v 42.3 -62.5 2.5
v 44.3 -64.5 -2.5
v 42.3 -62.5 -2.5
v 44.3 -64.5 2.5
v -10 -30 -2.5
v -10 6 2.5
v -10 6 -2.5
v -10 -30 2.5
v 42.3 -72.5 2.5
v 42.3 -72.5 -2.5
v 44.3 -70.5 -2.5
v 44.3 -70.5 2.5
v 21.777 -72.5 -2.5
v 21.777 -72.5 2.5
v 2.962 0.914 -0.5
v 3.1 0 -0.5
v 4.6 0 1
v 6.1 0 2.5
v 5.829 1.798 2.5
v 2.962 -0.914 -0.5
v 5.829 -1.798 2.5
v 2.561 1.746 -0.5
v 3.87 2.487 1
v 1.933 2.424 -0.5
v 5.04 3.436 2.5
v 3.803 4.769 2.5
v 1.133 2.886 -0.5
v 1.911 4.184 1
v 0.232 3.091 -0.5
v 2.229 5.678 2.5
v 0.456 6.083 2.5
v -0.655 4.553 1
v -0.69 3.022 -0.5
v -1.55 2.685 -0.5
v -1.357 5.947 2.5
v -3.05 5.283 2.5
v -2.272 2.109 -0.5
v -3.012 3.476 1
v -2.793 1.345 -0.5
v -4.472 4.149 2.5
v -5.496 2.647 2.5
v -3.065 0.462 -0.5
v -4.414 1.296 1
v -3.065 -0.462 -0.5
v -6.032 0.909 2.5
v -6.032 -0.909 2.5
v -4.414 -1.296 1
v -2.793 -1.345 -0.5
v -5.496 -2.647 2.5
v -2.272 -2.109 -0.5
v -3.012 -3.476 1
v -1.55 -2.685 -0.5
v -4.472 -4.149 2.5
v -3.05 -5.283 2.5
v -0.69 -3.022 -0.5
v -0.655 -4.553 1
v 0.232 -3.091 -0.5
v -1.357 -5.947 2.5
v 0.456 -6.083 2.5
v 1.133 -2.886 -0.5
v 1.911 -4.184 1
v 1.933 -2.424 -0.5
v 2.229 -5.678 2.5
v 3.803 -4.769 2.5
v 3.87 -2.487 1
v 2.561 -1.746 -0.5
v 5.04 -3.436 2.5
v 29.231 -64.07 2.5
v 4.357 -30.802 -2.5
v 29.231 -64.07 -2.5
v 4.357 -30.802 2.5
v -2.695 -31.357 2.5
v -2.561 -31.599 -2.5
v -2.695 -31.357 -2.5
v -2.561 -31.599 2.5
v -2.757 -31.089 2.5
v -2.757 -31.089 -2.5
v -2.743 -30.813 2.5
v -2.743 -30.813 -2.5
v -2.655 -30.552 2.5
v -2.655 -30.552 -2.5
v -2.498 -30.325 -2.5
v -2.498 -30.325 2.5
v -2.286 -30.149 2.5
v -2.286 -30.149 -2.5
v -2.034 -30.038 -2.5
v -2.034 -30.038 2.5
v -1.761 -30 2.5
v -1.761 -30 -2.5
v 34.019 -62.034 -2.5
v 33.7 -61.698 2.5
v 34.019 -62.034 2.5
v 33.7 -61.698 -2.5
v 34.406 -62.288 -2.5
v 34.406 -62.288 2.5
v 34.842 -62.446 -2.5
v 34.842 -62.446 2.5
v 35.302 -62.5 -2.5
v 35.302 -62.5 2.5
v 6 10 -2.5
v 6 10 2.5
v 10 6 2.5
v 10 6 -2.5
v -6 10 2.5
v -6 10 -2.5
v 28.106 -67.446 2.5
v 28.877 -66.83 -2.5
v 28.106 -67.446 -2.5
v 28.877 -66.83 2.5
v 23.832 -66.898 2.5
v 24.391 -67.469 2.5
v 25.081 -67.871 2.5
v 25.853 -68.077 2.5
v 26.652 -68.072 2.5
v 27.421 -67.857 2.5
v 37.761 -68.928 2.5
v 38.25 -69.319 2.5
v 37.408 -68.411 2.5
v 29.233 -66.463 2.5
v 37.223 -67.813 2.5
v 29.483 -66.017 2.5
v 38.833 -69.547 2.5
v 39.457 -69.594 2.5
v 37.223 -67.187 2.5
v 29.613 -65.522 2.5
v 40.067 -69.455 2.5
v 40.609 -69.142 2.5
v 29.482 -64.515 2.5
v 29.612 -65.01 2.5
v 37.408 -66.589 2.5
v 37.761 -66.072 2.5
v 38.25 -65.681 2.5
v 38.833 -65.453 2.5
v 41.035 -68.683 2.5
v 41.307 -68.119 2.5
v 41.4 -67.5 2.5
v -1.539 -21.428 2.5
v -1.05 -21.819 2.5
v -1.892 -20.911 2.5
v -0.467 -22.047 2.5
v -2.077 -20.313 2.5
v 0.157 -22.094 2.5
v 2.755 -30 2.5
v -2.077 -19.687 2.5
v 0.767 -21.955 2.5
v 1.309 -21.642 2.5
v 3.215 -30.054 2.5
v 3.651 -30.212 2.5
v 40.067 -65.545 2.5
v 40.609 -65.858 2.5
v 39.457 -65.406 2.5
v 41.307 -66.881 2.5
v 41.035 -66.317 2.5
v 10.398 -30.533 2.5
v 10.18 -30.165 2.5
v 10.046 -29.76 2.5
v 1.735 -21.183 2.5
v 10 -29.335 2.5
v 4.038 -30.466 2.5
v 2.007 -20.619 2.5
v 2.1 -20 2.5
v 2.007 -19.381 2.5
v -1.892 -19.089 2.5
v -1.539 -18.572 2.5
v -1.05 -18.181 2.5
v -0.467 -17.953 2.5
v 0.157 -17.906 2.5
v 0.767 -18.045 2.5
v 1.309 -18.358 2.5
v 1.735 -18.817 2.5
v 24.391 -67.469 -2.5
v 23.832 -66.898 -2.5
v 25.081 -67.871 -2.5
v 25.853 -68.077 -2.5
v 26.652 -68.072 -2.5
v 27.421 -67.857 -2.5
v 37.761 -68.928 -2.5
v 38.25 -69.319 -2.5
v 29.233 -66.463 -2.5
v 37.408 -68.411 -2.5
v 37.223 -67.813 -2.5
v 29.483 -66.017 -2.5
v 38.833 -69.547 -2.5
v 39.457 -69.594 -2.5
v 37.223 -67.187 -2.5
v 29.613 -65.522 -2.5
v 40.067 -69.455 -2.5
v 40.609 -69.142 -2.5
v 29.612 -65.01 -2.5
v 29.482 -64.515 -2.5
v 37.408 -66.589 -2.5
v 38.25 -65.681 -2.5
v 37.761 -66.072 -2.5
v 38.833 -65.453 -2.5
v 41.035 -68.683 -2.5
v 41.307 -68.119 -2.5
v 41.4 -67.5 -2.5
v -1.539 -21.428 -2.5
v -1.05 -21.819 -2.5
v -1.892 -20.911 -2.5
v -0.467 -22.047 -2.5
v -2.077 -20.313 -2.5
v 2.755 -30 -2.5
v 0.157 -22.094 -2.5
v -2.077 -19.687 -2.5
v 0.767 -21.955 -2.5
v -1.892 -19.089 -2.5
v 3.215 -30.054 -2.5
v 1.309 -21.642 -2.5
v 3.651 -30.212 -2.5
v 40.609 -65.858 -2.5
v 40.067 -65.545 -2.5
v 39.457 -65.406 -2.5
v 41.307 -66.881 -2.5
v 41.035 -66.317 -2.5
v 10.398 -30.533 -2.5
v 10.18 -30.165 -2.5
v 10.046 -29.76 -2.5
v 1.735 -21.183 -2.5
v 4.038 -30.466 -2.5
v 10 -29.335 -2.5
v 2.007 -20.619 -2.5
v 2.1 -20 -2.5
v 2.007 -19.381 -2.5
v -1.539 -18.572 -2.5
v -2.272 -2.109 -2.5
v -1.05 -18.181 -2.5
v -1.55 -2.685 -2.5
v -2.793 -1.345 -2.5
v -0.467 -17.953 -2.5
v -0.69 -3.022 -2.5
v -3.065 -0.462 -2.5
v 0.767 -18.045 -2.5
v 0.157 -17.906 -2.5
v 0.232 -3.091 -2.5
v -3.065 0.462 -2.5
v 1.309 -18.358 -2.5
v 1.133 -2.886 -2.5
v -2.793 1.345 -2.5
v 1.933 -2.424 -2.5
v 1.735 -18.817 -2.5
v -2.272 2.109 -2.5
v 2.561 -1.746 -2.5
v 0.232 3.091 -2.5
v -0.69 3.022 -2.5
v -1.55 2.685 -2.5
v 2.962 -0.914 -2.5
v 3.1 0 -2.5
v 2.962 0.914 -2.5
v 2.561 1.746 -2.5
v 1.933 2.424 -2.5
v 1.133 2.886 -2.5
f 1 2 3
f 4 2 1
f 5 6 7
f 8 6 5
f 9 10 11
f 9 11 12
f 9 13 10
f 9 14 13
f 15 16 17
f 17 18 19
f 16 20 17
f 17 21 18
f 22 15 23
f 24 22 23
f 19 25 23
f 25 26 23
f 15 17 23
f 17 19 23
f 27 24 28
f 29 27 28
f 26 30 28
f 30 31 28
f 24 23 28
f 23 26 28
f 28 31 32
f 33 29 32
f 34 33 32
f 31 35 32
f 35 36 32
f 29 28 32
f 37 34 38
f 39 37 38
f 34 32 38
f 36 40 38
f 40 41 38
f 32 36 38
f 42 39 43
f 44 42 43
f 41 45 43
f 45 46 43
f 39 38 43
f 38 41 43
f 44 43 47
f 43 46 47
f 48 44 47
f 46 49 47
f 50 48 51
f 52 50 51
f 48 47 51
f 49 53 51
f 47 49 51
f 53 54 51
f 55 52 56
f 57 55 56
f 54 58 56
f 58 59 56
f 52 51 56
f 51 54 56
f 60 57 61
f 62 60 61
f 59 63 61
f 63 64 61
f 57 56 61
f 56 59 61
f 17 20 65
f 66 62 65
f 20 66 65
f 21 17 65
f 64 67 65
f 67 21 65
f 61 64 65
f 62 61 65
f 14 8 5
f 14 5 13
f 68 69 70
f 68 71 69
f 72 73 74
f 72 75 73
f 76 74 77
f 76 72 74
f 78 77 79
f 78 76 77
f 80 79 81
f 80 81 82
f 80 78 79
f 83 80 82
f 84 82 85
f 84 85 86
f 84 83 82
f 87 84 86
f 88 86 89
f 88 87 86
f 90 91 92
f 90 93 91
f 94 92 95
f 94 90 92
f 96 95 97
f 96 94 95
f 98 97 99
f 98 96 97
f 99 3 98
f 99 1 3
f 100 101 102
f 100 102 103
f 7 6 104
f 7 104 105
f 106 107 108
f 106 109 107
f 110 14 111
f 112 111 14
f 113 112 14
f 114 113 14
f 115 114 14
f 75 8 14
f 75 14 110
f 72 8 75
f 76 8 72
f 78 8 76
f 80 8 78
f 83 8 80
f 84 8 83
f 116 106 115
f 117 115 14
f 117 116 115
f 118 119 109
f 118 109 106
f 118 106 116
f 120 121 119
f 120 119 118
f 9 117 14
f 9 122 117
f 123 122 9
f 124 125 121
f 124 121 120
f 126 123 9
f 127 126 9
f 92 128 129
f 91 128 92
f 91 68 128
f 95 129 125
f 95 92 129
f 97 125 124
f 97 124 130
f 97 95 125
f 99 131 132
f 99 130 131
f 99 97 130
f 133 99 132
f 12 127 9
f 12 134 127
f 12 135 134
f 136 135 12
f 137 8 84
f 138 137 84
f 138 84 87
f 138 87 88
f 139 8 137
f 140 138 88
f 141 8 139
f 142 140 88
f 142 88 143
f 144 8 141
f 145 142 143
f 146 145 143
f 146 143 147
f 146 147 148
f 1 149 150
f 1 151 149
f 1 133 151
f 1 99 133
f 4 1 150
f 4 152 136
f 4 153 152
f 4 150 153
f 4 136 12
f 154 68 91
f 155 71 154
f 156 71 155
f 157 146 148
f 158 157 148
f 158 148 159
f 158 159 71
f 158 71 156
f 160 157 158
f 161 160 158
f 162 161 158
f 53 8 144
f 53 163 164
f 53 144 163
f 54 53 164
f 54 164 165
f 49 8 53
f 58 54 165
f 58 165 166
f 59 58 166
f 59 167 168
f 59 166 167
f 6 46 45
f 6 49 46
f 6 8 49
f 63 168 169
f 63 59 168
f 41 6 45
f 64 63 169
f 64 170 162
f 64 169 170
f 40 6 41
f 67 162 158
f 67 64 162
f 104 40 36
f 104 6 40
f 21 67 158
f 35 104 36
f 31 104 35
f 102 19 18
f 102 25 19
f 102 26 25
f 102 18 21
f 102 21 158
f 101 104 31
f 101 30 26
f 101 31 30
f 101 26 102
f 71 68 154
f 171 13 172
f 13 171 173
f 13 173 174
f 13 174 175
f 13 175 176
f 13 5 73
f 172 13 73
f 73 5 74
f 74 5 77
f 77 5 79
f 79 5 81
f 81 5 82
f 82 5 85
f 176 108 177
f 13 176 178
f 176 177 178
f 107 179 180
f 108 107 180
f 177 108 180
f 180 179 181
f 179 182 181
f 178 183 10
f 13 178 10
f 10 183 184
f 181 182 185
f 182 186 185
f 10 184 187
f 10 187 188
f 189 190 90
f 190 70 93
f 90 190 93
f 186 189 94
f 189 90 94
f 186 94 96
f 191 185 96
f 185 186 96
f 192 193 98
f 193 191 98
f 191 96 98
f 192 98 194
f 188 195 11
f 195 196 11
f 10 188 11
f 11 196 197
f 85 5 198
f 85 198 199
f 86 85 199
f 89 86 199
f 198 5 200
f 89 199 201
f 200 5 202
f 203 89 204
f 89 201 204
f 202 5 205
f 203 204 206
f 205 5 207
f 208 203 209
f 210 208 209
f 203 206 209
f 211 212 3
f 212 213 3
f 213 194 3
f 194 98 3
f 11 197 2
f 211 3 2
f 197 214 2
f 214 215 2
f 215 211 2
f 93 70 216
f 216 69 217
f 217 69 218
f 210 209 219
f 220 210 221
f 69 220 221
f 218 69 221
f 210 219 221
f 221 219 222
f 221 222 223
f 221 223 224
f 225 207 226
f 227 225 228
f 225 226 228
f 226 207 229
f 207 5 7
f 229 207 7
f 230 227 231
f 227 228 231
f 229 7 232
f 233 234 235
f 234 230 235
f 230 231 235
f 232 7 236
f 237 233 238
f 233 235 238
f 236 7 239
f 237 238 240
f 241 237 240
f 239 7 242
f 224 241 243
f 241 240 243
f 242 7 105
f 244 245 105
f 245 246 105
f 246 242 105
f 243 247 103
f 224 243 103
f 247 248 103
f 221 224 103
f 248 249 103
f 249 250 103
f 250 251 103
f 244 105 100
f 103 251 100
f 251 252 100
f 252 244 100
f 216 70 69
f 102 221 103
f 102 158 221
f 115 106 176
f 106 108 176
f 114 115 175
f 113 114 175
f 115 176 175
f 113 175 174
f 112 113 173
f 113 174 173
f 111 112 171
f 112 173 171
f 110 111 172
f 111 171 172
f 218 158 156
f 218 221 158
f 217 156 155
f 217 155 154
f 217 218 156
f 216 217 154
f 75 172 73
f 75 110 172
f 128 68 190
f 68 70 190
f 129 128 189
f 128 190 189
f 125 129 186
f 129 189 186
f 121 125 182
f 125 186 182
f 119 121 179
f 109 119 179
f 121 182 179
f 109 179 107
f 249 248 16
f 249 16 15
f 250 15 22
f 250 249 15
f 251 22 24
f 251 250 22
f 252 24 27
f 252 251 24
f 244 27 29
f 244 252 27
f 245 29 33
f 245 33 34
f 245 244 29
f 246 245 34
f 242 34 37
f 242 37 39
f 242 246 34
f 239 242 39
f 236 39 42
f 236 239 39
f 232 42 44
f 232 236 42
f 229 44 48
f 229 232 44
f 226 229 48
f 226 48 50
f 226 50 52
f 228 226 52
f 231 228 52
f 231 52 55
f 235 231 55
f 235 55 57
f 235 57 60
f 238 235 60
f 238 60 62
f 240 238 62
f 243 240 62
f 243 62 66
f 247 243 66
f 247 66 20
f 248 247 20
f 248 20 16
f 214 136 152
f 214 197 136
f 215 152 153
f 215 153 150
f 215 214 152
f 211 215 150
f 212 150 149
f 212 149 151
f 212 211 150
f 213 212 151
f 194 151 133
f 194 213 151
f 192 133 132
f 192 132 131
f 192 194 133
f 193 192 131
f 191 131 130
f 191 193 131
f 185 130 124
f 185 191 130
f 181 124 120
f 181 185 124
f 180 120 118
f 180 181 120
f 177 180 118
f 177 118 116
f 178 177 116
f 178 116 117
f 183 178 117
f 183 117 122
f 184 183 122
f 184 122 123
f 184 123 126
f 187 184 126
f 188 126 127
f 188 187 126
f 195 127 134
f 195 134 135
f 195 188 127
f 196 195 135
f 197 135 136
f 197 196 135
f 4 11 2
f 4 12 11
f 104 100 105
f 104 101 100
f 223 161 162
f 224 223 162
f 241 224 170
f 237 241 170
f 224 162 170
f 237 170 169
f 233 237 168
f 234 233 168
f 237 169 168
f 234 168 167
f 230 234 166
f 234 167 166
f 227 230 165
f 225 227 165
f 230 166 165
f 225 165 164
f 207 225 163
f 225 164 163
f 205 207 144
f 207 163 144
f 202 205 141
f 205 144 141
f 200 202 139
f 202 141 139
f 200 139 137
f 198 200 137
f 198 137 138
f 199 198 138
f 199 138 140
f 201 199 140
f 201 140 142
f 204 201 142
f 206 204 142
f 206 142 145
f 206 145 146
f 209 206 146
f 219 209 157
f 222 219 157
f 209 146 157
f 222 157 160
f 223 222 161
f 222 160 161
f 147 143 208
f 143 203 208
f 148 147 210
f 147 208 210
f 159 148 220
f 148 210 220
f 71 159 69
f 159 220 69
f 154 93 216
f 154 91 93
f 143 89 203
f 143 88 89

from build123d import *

# Parameters (mm, degrees)
SKETCH_1_R          = 2.1
SKETCH_1_R_2        = 3.1
EXTRUDE_1_DEPTH     = 2.5
FILLET_1_R          = 2
FILLET_2_R          = 3
CHAMFER_1_SIZE      = 4
CHAMFER_2_SIZE      = 2
FILLET_3_R          = 1
SKETCH_2_R          = 2.1
CUT_EXTRUDE_1_DEPTH = 5
CHAMFER_3_SIZE      = 3


with BuildPart() as part:
    # 草图1 → 凸台-拉伸1 (new, symmetric)
    with BuildSketch(Plane.XY):
        Polygon((-10, 10), (-10, -30), (21.776923077, -72.5), (44.3, -72.5), (44.3, -62.5), (34.3, -62.5), (10, -30), (10, 10), align=None)
        with Locations((39.3, -67.5)):
            Circle(SKETCH_1_R, mode=Mode.SUBTRACT)
        Circle(SKETCH_1_R_2, mode=Mode.SUBTRACT)
        Polygon((-3.756916253, -30), (3.756916253, -30), (30.3908691, -65.621541874), (25.686053977, -69.378458126), align=None, mode=Mode.SUBTRACT)
    extrude(amount=EXTRUDE_1_DEPTH, both=True)

    # 圆角1
    fillet_1_edges = [part.edges().sort_by_distance(p)[0] for p in [
        (10, -30, 0),
        (34.3, -62.5, 0),
        (30.3908691, -65.621541874, 0),
        (3.756916253, -30, 0),
    ]]
    fillet(fillet_1_edges, radius=FILLET_1_R)

    # 圆角2
    fillet_2_edges = [part.edges().sort_by_distance(p)[0] for p in [
        (25.686053977, -69.378458126, 0),
    ]]
    fillet(fillet_2_edges, radius=FILLET_2_R)

    # 倒角1
    chamfer_1_edges = [part.edges().sort_by_distance(p)[0] for p in [
        (10, 10, 0),
        (-10, 10, 0),
    ]]
    chamfer(chamfer_1_edges, length=CHAMFER_1_SIZE)

    # 倒角2
    chamfer_2_edges = [part.edges().sort_by_distance(p)[0] for p in [
        (44.3, -62.5, 0),
        (44.3, -72.5, 0),
    ]]
    chamfer(chamfer_2_edges, length=CHAMFER_2_SIZE)

    # 圆角3
    fillet_3_edges = [part.edges().sort_by_distance(p)[0] for p in [
        (-3.756916253, -30, 0),
    ]]
    fillet(fillet_3_edges, radius=FILLET_3_R)

    # 草图2 → 切除-拉伸1 (cut)
    with BuildSketch(Plane.XY.offset(2.5)):
        with Locations((0, -20)):
            Circle(SKETCH_2_R)
    extrude(amount=-CUT_EXTRUDE_1_DEPTH, mode=Mode.SUBTRACT)

    # 倒角3
    chamfer_3_edges = [part.edges().sort_by_distance(p)[0] for p in [
        (-3.1, 0, 2.5),
    ]]
    chamfer(chamfer_3_edges, length=CHAMFER_3_SIZE)


solid = part.part
